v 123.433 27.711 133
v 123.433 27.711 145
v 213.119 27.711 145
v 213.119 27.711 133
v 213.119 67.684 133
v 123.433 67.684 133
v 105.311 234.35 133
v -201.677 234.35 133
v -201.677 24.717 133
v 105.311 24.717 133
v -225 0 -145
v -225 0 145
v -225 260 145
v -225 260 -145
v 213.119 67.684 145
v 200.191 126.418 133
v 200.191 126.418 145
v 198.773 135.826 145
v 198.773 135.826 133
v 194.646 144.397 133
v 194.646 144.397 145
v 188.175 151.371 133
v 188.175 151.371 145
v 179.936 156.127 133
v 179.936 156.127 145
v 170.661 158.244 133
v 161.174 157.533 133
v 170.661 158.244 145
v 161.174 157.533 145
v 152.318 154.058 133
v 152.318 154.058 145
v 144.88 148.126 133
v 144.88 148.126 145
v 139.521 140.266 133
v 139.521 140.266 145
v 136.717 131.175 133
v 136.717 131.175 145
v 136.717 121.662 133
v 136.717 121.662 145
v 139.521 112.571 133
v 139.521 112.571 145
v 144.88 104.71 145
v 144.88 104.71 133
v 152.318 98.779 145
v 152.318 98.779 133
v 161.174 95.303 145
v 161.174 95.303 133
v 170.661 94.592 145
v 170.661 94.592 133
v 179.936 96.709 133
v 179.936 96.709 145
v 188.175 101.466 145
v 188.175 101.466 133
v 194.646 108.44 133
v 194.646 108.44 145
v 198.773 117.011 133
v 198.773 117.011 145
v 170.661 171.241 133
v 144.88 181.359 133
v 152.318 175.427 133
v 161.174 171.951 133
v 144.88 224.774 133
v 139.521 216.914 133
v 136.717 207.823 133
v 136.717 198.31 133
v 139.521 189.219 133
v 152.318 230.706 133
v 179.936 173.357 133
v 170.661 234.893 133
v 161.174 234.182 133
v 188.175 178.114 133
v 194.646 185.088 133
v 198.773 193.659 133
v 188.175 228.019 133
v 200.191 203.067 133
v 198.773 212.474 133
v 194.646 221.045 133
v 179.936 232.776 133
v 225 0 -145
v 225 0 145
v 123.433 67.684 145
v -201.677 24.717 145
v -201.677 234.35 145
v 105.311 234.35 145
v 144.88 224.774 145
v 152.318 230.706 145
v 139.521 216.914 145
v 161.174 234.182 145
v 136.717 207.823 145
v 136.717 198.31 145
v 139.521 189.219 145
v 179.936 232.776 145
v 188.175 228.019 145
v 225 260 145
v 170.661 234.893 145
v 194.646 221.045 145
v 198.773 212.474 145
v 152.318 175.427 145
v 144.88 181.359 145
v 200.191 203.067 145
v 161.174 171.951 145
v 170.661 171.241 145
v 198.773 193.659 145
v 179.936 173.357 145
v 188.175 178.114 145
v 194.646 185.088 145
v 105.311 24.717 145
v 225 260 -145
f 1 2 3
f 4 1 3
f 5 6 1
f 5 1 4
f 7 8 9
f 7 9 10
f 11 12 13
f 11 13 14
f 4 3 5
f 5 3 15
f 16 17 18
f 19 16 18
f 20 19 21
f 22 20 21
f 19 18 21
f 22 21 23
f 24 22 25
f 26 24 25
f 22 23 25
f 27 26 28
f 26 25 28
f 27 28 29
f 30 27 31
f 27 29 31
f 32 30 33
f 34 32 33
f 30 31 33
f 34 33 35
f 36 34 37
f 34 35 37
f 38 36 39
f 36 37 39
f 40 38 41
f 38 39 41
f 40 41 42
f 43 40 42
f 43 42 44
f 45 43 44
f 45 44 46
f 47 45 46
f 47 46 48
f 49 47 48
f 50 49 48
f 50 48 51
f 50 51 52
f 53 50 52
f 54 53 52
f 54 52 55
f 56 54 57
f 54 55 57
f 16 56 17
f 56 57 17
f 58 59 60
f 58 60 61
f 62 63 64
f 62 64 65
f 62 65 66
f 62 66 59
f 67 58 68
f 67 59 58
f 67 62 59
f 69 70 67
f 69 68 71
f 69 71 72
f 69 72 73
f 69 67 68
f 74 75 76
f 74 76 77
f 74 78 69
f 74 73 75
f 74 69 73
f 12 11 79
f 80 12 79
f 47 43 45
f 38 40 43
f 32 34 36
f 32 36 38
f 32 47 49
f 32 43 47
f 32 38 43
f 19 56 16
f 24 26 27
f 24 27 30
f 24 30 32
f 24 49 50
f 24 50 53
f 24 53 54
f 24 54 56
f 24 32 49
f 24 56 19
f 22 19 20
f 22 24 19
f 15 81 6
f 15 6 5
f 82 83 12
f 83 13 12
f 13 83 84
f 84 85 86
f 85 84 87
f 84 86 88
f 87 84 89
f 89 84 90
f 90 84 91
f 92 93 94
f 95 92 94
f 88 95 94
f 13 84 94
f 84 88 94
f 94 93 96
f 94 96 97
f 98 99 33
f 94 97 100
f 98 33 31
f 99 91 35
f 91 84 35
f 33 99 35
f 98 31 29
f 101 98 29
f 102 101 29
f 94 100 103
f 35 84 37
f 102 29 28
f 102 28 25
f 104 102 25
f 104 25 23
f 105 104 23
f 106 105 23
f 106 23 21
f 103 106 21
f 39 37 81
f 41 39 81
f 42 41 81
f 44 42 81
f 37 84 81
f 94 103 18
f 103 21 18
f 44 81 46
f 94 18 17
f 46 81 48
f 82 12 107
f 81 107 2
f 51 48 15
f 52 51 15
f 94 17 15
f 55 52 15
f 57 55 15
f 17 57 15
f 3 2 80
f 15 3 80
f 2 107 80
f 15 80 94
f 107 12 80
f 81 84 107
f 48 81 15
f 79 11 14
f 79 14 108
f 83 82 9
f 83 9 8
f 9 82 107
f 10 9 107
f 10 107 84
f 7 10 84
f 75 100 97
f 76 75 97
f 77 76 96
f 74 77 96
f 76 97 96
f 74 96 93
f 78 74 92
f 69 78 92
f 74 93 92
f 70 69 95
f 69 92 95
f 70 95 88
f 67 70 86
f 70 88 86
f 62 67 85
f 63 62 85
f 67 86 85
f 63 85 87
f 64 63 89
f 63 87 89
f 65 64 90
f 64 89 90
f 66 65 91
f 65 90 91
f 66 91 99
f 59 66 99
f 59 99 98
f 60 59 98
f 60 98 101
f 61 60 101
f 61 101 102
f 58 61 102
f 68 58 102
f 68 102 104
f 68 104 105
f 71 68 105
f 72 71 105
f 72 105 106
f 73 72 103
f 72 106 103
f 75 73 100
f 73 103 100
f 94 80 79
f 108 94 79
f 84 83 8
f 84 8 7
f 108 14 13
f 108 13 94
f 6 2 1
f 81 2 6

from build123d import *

# Parameters (mm, degrees)
SKETCH1_W           = 450
SKETCH1_H           = 290
BOSS_EXTRUDE1_DEPTH = 260
SKETCH2_R           = 31.915290565
SKETCH2_W           = 89.685507292
SKETCH2_H           = 39.972356382
SKETCH2_W_2         = 306.987697012
SKETCH2_H_2         = 209.632802358
CUT_EXTRUDE1_DEPTH  = 12


with BuildPart() as part:
    # Sketch1 → Boss-Extrude1 (new body)
    with BuildSketch(Plane(origin=(0, 0, 0), x_dir=(1, 0, 0), z_dir=(0, 1, 0))):
        Rectangle(SKETCH1_W, SKETCH1_H)
    extrude(amount=BOSS_EXTRUDE1_DEPTH)

    # Sketch2 → Cut-Extrude1 (cut)
    with BuildSketch(Plane.XY.offset(145)):
        with Locations((168.275900741, 203.066569732)):
            Circle(SKETCH2_R)
        with Locations((168.275900741, 126.418305405)):
            Circle(SKETCH2_R)
        with Locations((168.275900741, 47.697411123)):
            Rectangle(SKETCH2_W, SKETCH2_H)
        with Locations((-48.183132642, 129.533317372)):
            Rectangle(SKETCH2_W_2, SKETCH2_H_2)
    extrude(amount=-CUT_EXTRUDE1_DEPTH, mode=Mode.SUBTRACT)


solid = part.part
